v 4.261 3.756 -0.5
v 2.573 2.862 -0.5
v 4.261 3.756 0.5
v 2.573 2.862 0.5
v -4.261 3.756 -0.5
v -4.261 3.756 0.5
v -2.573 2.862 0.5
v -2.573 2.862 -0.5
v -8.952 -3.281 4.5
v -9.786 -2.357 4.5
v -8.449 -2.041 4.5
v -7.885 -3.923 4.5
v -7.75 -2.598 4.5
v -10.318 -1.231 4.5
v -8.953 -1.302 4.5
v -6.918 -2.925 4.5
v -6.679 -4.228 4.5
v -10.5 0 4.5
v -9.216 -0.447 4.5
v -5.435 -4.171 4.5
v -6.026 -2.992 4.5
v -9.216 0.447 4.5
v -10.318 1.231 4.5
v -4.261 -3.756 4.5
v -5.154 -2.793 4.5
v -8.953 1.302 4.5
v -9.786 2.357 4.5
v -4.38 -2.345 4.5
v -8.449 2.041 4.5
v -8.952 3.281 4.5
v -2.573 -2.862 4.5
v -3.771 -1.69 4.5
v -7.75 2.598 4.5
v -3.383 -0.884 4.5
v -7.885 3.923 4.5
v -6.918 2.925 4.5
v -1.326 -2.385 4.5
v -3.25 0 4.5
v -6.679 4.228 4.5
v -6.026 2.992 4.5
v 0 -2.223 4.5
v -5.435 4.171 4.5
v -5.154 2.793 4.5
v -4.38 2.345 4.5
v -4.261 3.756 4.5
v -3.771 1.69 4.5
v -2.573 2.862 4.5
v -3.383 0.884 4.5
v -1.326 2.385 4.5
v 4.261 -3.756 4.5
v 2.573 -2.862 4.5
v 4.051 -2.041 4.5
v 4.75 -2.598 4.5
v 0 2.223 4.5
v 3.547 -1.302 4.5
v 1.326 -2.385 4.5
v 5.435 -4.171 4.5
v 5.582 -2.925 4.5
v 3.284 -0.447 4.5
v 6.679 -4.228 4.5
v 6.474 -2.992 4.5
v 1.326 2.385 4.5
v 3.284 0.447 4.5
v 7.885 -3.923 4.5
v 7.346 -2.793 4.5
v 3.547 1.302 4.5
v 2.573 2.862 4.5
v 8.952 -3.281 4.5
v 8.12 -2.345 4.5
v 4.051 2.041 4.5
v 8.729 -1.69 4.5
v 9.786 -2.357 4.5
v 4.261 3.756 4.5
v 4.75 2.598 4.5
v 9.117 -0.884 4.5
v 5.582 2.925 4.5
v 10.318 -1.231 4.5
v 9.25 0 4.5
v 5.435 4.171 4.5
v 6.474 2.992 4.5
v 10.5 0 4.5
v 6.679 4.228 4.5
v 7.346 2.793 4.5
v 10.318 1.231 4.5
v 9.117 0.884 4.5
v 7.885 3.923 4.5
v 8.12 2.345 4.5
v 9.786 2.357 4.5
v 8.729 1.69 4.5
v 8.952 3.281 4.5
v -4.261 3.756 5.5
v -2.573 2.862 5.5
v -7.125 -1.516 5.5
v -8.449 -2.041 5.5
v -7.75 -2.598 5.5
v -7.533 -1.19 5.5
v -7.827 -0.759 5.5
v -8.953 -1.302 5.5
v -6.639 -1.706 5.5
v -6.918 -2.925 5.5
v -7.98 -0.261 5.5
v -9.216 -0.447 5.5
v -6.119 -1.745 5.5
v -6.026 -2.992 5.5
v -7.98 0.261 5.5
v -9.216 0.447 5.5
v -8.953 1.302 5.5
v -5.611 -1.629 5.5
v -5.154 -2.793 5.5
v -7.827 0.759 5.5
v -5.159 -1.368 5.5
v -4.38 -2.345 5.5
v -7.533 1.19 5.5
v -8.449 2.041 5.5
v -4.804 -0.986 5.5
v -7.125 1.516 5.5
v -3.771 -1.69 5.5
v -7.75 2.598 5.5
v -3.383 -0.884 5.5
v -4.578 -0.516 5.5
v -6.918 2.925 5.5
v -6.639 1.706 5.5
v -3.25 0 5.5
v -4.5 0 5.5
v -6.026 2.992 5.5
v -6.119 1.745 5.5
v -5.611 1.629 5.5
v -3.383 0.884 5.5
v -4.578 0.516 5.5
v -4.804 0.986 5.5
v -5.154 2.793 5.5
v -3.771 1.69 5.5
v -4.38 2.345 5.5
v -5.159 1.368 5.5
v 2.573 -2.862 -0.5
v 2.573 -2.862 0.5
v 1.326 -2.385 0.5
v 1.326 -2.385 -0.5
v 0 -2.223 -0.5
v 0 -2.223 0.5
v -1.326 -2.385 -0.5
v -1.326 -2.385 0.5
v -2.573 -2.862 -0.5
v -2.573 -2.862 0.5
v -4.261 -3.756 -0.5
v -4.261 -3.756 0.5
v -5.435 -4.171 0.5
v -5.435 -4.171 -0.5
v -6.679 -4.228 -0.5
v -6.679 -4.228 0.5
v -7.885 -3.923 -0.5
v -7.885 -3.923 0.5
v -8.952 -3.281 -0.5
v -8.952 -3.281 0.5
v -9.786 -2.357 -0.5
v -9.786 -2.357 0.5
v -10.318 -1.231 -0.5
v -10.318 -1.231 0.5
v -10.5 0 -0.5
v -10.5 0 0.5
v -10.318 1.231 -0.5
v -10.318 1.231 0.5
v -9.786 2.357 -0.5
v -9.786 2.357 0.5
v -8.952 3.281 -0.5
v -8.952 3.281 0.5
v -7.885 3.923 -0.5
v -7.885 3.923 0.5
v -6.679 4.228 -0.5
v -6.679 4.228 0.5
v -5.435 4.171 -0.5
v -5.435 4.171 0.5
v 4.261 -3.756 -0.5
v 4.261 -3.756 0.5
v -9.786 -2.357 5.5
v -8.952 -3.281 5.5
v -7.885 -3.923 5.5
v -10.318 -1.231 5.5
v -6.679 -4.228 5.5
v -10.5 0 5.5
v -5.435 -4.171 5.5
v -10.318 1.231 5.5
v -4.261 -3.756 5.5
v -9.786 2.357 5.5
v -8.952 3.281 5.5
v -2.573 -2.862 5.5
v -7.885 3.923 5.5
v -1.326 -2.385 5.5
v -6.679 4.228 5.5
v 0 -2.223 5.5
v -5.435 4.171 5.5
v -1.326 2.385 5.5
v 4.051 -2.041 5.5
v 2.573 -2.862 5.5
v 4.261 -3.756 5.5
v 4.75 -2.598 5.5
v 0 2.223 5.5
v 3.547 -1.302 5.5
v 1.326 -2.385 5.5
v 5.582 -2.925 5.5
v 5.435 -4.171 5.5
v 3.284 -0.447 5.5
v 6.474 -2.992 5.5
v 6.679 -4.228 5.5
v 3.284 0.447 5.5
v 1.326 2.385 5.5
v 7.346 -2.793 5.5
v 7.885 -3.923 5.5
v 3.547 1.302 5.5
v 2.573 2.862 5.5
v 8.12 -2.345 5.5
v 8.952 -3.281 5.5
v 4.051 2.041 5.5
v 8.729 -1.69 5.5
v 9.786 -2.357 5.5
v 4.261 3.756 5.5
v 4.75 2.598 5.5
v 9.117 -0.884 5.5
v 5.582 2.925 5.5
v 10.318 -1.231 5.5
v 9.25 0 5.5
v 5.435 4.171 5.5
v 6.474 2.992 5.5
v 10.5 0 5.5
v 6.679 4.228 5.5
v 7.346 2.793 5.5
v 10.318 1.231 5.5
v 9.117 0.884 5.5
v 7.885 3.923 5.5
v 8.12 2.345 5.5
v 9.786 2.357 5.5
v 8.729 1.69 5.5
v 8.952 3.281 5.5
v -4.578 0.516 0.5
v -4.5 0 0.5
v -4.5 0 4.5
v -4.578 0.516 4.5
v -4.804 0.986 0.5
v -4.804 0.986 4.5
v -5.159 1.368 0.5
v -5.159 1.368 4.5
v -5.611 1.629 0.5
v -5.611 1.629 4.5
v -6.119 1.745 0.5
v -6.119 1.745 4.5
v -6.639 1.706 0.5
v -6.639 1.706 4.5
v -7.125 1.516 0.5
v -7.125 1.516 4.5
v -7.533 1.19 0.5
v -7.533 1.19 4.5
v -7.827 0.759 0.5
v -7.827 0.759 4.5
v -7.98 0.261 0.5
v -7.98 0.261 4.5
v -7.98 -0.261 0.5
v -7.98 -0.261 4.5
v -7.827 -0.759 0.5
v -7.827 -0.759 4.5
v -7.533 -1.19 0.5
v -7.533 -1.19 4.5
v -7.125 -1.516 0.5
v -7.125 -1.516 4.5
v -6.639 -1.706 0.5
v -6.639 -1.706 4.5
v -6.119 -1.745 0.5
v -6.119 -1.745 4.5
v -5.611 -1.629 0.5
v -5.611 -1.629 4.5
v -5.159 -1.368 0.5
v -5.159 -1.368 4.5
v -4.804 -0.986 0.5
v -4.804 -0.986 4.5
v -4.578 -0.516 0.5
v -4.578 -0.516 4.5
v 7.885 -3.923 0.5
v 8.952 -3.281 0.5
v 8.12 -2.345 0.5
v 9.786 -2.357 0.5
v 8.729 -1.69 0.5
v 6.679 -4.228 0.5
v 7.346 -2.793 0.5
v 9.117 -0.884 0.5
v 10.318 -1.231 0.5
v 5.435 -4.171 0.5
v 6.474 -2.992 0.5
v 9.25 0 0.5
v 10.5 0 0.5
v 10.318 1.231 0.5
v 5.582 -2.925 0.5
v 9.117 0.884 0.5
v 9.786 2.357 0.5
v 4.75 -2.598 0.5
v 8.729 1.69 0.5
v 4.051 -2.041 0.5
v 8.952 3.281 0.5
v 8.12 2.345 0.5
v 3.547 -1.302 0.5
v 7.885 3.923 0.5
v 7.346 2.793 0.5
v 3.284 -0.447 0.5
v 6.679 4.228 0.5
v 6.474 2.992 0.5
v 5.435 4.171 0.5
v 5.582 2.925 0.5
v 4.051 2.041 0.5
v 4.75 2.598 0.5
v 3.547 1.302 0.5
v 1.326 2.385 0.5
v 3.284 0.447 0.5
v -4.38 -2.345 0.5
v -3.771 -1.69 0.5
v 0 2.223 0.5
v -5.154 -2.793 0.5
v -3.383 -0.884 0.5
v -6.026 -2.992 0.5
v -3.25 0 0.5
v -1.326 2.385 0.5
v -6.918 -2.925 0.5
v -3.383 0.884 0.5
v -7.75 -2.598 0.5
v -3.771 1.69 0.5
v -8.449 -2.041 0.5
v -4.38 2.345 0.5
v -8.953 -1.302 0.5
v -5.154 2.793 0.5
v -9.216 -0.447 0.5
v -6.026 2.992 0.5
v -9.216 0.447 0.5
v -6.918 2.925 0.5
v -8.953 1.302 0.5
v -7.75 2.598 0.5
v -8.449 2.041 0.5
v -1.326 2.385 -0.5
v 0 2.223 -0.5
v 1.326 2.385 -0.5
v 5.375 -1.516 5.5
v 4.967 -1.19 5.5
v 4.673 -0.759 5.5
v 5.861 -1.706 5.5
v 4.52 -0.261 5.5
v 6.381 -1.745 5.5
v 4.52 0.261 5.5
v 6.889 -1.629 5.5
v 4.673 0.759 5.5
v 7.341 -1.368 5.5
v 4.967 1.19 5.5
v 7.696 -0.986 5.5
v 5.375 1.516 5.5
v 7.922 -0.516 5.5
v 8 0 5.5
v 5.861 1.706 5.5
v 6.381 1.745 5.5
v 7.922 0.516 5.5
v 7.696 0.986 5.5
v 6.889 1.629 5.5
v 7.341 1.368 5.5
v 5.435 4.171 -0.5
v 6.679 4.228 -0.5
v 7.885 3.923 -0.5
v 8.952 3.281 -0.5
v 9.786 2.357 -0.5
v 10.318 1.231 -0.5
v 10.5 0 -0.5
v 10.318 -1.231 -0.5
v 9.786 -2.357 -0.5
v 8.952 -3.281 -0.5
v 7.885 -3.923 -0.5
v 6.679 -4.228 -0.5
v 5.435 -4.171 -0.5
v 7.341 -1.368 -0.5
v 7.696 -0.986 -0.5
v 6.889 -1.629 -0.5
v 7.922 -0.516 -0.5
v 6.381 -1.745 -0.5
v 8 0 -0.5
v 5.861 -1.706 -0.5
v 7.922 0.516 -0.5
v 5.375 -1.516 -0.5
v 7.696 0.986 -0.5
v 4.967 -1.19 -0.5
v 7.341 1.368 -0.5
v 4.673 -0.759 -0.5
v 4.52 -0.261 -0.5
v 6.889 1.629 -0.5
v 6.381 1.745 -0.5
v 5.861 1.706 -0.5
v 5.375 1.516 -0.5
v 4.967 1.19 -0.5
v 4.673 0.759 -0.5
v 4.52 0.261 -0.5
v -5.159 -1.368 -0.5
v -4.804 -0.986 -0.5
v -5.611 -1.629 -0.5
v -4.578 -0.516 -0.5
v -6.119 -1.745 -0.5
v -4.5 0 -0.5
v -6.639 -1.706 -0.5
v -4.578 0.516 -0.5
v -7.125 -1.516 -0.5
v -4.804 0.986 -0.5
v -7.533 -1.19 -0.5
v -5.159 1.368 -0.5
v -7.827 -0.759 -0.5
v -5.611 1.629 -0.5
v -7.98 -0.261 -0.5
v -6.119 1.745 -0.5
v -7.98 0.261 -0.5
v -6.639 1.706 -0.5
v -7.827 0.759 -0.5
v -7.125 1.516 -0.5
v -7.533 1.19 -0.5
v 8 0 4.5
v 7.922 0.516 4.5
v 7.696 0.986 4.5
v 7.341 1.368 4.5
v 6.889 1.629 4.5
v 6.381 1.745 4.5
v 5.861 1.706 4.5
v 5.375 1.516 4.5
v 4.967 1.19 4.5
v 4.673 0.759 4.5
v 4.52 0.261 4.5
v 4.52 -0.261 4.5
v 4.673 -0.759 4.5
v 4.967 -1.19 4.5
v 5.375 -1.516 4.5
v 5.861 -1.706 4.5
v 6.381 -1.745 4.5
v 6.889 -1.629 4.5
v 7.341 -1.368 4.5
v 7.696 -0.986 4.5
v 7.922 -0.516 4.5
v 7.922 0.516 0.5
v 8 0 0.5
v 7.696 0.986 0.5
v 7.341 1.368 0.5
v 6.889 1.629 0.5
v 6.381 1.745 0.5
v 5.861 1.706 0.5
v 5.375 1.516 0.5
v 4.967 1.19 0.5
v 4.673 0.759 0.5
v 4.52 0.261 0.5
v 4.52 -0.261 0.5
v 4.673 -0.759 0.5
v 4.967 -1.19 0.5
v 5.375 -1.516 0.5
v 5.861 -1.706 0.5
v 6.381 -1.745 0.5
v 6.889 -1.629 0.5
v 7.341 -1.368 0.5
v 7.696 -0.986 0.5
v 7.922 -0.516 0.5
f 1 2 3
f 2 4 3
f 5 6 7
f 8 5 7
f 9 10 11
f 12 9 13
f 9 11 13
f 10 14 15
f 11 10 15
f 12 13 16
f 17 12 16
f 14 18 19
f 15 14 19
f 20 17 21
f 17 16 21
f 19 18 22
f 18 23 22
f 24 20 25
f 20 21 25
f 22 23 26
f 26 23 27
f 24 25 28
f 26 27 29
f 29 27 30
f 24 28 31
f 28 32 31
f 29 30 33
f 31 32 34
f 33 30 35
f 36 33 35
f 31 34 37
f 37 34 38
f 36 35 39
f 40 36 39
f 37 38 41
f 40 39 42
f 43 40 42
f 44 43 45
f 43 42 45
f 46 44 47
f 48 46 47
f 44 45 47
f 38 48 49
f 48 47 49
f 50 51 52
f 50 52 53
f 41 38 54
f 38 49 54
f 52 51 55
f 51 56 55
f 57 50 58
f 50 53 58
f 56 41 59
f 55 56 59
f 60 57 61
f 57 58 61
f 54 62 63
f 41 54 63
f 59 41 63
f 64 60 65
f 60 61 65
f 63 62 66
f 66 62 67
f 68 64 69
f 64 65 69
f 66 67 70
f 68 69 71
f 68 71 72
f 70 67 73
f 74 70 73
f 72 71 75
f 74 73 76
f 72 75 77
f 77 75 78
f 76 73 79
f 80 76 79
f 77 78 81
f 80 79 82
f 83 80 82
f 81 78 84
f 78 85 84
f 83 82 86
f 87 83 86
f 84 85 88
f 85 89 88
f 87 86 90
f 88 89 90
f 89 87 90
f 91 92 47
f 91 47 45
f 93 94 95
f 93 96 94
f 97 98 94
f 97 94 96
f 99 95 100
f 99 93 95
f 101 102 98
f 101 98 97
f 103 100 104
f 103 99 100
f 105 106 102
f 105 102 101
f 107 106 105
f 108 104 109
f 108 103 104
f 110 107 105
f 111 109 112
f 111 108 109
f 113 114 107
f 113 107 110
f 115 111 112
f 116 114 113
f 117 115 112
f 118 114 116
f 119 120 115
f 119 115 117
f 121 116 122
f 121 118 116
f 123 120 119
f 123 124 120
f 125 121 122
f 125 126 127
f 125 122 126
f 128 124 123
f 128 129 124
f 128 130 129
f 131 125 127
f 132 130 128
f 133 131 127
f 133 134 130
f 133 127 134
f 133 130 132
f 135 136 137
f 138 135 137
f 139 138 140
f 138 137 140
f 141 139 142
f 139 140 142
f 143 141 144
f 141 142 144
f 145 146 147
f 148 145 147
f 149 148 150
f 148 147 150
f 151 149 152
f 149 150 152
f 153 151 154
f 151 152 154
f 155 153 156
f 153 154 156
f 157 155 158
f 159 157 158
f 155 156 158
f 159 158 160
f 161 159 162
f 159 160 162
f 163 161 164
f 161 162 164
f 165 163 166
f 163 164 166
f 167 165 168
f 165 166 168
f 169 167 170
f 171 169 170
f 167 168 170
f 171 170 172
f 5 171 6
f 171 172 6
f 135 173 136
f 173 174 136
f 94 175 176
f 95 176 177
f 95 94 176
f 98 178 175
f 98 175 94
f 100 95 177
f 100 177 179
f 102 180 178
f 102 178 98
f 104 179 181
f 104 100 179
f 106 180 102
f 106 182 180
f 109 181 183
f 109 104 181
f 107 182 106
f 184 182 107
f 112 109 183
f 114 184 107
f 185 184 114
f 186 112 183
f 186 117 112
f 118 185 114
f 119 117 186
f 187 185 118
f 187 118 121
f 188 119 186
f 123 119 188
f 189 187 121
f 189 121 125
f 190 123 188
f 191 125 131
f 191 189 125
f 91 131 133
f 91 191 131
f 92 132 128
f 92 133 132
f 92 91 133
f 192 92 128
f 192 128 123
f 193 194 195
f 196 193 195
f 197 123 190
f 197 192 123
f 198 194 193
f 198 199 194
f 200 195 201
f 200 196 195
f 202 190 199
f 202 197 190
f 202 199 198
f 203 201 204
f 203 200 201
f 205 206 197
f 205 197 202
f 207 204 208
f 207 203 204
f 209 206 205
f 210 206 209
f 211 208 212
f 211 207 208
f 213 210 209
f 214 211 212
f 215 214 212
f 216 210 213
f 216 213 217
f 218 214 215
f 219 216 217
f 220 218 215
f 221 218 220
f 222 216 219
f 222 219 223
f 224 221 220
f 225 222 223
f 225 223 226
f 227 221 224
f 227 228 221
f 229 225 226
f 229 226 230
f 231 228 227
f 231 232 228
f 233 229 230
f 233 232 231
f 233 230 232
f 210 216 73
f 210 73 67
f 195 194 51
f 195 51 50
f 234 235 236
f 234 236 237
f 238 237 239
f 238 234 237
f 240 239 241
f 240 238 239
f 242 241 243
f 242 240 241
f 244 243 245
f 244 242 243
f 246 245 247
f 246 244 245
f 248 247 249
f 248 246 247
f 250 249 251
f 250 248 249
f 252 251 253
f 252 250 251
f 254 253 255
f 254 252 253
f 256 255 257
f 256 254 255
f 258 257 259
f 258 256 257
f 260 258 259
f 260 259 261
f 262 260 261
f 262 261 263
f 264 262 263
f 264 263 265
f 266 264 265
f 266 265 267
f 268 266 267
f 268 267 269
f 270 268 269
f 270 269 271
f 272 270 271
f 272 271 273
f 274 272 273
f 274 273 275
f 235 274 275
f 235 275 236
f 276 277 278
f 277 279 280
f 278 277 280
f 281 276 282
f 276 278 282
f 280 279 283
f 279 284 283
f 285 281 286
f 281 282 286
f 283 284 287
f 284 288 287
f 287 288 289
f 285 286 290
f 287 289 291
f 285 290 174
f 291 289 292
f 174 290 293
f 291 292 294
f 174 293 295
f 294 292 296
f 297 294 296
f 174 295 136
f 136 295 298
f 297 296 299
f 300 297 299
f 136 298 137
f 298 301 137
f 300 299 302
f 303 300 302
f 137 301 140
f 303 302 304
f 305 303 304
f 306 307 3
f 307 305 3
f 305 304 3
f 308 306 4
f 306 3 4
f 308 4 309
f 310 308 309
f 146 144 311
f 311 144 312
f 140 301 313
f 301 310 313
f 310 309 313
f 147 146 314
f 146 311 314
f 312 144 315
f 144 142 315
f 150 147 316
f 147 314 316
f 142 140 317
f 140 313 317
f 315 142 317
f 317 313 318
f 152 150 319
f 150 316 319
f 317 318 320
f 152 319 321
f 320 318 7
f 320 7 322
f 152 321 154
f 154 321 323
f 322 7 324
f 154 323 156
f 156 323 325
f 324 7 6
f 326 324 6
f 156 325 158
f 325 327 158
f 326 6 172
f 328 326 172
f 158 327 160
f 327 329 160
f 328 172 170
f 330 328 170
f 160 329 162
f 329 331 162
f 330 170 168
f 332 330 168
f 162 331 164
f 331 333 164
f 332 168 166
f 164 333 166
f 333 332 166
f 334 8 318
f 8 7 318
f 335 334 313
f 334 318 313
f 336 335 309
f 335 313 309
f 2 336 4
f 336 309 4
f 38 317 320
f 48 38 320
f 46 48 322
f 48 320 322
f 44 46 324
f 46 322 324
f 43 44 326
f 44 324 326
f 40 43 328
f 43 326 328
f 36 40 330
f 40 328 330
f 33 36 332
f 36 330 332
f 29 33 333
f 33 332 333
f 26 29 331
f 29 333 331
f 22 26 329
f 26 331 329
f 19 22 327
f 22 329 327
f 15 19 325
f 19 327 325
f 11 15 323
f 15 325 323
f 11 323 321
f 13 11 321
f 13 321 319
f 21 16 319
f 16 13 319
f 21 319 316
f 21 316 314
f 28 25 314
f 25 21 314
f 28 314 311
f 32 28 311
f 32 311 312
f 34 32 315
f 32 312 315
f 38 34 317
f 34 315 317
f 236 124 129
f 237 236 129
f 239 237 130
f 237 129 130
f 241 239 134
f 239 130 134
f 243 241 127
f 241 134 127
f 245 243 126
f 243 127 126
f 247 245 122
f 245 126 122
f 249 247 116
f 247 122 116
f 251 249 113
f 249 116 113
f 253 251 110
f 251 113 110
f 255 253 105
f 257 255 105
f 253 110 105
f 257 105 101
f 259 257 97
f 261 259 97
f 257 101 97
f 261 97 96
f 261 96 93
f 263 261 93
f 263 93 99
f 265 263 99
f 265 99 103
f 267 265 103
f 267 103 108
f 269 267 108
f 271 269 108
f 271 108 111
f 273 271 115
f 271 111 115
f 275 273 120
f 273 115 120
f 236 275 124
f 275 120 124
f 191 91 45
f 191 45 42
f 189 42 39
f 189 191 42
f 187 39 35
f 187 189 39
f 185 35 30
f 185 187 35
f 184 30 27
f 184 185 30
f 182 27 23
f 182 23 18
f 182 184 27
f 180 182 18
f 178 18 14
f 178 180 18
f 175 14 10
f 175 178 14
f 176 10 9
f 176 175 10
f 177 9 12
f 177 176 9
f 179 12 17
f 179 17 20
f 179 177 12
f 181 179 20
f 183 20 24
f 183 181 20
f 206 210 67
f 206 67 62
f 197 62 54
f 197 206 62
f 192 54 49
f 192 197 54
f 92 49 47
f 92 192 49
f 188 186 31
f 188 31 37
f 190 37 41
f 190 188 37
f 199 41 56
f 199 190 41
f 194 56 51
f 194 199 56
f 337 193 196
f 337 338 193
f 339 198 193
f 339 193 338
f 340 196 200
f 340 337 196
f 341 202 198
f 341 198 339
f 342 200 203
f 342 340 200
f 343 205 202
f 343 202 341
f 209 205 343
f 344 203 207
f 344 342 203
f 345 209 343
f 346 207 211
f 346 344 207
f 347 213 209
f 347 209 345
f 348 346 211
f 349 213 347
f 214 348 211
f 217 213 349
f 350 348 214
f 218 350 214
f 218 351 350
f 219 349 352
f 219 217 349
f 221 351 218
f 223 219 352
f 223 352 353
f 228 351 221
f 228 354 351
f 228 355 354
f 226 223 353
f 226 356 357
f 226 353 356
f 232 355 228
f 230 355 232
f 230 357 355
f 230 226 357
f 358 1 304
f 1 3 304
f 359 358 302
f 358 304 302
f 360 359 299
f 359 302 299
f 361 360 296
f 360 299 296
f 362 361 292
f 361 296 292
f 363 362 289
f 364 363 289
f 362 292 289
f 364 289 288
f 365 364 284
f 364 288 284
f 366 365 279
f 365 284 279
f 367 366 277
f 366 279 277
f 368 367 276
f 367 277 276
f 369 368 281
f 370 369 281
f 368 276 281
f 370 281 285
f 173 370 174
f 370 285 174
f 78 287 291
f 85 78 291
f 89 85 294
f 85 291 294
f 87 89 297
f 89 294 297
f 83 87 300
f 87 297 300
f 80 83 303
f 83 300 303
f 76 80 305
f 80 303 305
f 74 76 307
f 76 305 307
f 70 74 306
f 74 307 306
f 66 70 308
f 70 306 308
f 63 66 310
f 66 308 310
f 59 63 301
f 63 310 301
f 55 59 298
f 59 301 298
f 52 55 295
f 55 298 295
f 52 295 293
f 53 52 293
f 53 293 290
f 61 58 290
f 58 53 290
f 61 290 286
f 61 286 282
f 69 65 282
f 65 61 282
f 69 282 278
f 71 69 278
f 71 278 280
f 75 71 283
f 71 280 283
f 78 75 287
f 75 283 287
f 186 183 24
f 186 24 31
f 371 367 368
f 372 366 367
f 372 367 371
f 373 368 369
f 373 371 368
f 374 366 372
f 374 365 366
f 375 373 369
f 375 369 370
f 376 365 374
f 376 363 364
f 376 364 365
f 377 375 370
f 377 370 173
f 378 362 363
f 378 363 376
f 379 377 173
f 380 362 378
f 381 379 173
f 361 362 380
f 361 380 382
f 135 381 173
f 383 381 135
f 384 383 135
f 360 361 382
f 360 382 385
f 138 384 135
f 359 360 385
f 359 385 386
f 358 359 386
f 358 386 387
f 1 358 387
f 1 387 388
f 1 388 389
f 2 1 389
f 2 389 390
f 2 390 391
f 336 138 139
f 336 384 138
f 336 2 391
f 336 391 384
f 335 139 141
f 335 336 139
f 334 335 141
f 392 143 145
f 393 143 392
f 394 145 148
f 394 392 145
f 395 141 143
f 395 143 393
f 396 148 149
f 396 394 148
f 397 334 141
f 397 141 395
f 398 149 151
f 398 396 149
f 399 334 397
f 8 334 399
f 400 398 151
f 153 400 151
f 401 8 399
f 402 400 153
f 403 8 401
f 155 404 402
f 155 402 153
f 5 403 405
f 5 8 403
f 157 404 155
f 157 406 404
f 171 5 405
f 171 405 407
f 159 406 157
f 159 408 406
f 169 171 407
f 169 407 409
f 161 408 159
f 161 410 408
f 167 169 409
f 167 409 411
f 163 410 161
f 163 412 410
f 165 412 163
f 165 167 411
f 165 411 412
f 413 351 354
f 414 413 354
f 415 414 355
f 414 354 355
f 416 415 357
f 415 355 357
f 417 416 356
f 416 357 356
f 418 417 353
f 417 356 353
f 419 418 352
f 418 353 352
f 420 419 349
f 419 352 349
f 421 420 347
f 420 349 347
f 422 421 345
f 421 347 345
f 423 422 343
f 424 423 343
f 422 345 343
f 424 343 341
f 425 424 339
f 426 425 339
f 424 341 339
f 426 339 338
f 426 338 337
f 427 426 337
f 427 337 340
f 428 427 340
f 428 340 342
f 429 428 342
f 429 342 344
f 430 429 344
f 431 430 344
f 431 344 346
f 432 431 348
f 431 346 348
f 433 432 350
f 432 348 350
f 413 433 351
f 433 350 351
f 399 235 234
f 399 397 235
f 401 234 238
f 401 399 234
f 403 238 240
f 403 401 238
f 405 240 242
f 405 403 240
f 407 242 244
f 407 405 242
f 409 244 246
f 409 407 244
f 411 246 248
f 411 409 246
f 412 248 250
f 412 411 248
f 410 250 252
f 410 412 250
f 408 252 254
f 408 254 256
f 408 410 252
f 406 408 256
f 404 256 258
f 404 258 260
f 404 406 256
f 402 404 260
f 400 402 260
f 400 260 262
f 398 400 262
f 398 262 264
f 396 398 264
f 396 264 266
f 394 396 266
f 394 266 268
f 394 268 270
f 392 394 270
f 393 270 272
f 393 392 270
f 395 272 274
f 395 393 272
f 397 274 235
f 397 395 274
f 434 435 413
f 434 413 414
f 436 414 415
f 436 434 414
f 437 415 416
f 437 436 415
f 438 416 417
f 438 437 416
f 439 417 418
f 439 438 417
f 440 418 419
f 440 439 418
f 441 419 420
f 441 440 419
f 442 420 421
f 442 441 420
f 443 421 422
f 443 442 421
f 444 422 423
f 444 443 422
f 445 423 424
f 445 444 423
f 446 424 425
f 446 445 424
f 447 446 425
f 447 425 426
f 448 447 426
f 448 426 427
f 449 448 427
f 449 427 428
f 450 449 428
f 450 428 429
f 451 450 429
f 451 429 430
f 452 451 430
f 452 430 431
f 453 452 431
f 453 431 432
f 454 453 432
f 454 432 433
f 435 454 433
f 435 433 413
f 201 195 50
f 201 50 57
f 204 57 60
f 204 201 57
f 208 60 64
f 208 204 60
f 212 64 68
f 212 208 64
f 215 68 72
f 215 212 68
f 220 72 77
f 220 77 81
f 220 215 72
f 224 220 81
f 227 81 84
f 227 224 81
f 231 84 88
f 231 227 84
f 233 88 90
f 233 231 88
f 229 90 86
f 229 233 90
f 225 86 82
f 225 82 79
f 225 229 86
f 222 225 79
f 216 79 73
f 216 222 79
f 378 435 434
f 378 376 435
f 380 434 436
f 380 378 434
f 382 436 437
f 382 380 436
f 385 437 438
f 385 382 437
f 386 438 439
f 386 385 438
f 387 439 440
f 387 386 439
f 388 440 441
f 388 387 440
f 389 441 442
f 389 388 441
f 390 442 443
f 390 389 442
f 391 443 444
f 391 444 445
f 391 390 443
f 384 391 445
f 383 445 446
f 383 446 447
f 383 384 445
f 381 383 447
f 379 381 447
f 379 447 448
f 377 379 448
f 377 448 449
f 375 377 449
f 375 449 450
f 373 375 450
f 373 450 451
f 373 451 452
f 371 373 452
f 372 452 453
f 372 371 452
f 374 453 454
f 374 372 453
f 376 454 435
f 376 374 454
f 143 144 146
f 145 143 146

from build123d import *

# Parameters (mm, degrees)
SKETCH1_R           = 1.75
BOSS_EXTRUDE1_DEPTH = 0.5
SKETCH2_R           = 1.75
BOSS_EXTRUDE2_DEPTH = 1
BOSS_EXTRUDE3_START = -6
SKETCH3_R           = 3
SKETCH3_R_2         = 1.75
BOSS_EXTRUDE3_DEPTH = 6


with BuildPart() as part:
    # Sketch1 → Boss-Extrude1 (new, symmetric)
    with BuildSketch(Plane.XY):
        with BuildLine():
            Line((-4.261461708, 3.756090449), (-2.573402496, 2.862403135))
            ThreePointArc((-2.573402496, 2.862403135), (0, 2.223226069), (2.573402496, 2.862403135))
            Line((2.573402496, 2.862403135), (4.261461708, 3.756090449))
            ThreePointArc((4.261461708, 3.756090449), (10.5, 0), (4.261461708, -3.756090449))
            Line((4.261461708, -3.756090449), (2.573402496, -2.862403135))
            ThreePointArc((2.573402496, -2.862403135), (0, -2.223226069), (-2.573402496, -2.862403135))
            Line((-2.573402496, -2.862403135), (-4.261461708, -3.756090449))
            ThreePointArc((-4.261461708, -3.756090449), (-10.5, 0), (-4.261461708, 3.756090449))
        make_face()
        with Locations((-6.25, 0)):
            Circle(SKETCH1_R, mode=Mode.SUBTRACT)
        with Locations((6.25, 0)):
            Circle(SKETCH1_R, mode=Mode.SUBTRACT)
    extrude(amount=BOSS_EXTRUDE1_DEPTH, both=True)



with BuildPart() as body_2:
    # Sketch2 → Boss-Extrude2 (new body)
    with BuildSketch(Plane.XY.offset(5.5)):
        with BuildLine():
            Line((-2.573402496, 2.862403135), (-4.261461708, 3.756090449))
            ThreePointArc((-4.261461708, 3.756090449), (-10.5, 0), (-4.261461708, -3.756090449))
            Line((-4.261461708, -3.756090449), (-2.573402496, -2.862403135))
            ThreePointArc((-2.573402496, -2.862403135), (0, -2.223226069), (2.573402496, -2.862403135))
            Line((2.573402496, -2.862403135), (4.261461708, -3.756090449))
            ThreePointArc((4.261461708, -3.756090449), (10.5, 0), (4.261461708, 3.756090449))
            Line((4.261461708, 3.756090449), (2.573402496, 2.862403135))
            ThreePointArc((2.573402496, 2.862403135), (0, 2.223226069), (-2.573402496, 2.862403135))
        make_face()
        with Locations((6.25, 0)):
            Circle(SKETCH2_R, mode=Mode.SUBTRACT)
        with Locations((-6.25, 0)):
            Circle(SKETCH2_R, mode=Mode.SUBTRACT)
    extrude(amount=-BOSS_EXTRUDE2_DEPTH)


with BuildPart() as part_1:
    add(part.part)

    add(body_2.part)  # Boss-Extrude3 merges body 2
    # Sketch3 → Boss-Extrude3 (add)
    # profile 1 of 2: a face of its own
    with BuildSketch(Plane.XY.offset(5.5).offset(BOSS_EXTRUDE3_START)):
        with Locations((-6.25, 0)):
            Circle(SKETCH3_R)
        with Locations((-6.25, 0)):
            Circle(SKETCH3_R_2, mode=Mode.SUBTRACT)
    # profile 2 of 2: a face of its own
    with BuildSketch(Plane.XY.offset(5.5).offset(BOSS_EXTRUDE3_START)):
        with Locations((6.25, 0)):
            Circle(SKETCH3_R)
        with Locations((6.25, 0)):
            Circle(SKETCH3_R_2, mode=Mode.SUBTRACT)
    extrude(amount=BOSS_EXTRUDE3_DEPTH)


solid = part_1.part
